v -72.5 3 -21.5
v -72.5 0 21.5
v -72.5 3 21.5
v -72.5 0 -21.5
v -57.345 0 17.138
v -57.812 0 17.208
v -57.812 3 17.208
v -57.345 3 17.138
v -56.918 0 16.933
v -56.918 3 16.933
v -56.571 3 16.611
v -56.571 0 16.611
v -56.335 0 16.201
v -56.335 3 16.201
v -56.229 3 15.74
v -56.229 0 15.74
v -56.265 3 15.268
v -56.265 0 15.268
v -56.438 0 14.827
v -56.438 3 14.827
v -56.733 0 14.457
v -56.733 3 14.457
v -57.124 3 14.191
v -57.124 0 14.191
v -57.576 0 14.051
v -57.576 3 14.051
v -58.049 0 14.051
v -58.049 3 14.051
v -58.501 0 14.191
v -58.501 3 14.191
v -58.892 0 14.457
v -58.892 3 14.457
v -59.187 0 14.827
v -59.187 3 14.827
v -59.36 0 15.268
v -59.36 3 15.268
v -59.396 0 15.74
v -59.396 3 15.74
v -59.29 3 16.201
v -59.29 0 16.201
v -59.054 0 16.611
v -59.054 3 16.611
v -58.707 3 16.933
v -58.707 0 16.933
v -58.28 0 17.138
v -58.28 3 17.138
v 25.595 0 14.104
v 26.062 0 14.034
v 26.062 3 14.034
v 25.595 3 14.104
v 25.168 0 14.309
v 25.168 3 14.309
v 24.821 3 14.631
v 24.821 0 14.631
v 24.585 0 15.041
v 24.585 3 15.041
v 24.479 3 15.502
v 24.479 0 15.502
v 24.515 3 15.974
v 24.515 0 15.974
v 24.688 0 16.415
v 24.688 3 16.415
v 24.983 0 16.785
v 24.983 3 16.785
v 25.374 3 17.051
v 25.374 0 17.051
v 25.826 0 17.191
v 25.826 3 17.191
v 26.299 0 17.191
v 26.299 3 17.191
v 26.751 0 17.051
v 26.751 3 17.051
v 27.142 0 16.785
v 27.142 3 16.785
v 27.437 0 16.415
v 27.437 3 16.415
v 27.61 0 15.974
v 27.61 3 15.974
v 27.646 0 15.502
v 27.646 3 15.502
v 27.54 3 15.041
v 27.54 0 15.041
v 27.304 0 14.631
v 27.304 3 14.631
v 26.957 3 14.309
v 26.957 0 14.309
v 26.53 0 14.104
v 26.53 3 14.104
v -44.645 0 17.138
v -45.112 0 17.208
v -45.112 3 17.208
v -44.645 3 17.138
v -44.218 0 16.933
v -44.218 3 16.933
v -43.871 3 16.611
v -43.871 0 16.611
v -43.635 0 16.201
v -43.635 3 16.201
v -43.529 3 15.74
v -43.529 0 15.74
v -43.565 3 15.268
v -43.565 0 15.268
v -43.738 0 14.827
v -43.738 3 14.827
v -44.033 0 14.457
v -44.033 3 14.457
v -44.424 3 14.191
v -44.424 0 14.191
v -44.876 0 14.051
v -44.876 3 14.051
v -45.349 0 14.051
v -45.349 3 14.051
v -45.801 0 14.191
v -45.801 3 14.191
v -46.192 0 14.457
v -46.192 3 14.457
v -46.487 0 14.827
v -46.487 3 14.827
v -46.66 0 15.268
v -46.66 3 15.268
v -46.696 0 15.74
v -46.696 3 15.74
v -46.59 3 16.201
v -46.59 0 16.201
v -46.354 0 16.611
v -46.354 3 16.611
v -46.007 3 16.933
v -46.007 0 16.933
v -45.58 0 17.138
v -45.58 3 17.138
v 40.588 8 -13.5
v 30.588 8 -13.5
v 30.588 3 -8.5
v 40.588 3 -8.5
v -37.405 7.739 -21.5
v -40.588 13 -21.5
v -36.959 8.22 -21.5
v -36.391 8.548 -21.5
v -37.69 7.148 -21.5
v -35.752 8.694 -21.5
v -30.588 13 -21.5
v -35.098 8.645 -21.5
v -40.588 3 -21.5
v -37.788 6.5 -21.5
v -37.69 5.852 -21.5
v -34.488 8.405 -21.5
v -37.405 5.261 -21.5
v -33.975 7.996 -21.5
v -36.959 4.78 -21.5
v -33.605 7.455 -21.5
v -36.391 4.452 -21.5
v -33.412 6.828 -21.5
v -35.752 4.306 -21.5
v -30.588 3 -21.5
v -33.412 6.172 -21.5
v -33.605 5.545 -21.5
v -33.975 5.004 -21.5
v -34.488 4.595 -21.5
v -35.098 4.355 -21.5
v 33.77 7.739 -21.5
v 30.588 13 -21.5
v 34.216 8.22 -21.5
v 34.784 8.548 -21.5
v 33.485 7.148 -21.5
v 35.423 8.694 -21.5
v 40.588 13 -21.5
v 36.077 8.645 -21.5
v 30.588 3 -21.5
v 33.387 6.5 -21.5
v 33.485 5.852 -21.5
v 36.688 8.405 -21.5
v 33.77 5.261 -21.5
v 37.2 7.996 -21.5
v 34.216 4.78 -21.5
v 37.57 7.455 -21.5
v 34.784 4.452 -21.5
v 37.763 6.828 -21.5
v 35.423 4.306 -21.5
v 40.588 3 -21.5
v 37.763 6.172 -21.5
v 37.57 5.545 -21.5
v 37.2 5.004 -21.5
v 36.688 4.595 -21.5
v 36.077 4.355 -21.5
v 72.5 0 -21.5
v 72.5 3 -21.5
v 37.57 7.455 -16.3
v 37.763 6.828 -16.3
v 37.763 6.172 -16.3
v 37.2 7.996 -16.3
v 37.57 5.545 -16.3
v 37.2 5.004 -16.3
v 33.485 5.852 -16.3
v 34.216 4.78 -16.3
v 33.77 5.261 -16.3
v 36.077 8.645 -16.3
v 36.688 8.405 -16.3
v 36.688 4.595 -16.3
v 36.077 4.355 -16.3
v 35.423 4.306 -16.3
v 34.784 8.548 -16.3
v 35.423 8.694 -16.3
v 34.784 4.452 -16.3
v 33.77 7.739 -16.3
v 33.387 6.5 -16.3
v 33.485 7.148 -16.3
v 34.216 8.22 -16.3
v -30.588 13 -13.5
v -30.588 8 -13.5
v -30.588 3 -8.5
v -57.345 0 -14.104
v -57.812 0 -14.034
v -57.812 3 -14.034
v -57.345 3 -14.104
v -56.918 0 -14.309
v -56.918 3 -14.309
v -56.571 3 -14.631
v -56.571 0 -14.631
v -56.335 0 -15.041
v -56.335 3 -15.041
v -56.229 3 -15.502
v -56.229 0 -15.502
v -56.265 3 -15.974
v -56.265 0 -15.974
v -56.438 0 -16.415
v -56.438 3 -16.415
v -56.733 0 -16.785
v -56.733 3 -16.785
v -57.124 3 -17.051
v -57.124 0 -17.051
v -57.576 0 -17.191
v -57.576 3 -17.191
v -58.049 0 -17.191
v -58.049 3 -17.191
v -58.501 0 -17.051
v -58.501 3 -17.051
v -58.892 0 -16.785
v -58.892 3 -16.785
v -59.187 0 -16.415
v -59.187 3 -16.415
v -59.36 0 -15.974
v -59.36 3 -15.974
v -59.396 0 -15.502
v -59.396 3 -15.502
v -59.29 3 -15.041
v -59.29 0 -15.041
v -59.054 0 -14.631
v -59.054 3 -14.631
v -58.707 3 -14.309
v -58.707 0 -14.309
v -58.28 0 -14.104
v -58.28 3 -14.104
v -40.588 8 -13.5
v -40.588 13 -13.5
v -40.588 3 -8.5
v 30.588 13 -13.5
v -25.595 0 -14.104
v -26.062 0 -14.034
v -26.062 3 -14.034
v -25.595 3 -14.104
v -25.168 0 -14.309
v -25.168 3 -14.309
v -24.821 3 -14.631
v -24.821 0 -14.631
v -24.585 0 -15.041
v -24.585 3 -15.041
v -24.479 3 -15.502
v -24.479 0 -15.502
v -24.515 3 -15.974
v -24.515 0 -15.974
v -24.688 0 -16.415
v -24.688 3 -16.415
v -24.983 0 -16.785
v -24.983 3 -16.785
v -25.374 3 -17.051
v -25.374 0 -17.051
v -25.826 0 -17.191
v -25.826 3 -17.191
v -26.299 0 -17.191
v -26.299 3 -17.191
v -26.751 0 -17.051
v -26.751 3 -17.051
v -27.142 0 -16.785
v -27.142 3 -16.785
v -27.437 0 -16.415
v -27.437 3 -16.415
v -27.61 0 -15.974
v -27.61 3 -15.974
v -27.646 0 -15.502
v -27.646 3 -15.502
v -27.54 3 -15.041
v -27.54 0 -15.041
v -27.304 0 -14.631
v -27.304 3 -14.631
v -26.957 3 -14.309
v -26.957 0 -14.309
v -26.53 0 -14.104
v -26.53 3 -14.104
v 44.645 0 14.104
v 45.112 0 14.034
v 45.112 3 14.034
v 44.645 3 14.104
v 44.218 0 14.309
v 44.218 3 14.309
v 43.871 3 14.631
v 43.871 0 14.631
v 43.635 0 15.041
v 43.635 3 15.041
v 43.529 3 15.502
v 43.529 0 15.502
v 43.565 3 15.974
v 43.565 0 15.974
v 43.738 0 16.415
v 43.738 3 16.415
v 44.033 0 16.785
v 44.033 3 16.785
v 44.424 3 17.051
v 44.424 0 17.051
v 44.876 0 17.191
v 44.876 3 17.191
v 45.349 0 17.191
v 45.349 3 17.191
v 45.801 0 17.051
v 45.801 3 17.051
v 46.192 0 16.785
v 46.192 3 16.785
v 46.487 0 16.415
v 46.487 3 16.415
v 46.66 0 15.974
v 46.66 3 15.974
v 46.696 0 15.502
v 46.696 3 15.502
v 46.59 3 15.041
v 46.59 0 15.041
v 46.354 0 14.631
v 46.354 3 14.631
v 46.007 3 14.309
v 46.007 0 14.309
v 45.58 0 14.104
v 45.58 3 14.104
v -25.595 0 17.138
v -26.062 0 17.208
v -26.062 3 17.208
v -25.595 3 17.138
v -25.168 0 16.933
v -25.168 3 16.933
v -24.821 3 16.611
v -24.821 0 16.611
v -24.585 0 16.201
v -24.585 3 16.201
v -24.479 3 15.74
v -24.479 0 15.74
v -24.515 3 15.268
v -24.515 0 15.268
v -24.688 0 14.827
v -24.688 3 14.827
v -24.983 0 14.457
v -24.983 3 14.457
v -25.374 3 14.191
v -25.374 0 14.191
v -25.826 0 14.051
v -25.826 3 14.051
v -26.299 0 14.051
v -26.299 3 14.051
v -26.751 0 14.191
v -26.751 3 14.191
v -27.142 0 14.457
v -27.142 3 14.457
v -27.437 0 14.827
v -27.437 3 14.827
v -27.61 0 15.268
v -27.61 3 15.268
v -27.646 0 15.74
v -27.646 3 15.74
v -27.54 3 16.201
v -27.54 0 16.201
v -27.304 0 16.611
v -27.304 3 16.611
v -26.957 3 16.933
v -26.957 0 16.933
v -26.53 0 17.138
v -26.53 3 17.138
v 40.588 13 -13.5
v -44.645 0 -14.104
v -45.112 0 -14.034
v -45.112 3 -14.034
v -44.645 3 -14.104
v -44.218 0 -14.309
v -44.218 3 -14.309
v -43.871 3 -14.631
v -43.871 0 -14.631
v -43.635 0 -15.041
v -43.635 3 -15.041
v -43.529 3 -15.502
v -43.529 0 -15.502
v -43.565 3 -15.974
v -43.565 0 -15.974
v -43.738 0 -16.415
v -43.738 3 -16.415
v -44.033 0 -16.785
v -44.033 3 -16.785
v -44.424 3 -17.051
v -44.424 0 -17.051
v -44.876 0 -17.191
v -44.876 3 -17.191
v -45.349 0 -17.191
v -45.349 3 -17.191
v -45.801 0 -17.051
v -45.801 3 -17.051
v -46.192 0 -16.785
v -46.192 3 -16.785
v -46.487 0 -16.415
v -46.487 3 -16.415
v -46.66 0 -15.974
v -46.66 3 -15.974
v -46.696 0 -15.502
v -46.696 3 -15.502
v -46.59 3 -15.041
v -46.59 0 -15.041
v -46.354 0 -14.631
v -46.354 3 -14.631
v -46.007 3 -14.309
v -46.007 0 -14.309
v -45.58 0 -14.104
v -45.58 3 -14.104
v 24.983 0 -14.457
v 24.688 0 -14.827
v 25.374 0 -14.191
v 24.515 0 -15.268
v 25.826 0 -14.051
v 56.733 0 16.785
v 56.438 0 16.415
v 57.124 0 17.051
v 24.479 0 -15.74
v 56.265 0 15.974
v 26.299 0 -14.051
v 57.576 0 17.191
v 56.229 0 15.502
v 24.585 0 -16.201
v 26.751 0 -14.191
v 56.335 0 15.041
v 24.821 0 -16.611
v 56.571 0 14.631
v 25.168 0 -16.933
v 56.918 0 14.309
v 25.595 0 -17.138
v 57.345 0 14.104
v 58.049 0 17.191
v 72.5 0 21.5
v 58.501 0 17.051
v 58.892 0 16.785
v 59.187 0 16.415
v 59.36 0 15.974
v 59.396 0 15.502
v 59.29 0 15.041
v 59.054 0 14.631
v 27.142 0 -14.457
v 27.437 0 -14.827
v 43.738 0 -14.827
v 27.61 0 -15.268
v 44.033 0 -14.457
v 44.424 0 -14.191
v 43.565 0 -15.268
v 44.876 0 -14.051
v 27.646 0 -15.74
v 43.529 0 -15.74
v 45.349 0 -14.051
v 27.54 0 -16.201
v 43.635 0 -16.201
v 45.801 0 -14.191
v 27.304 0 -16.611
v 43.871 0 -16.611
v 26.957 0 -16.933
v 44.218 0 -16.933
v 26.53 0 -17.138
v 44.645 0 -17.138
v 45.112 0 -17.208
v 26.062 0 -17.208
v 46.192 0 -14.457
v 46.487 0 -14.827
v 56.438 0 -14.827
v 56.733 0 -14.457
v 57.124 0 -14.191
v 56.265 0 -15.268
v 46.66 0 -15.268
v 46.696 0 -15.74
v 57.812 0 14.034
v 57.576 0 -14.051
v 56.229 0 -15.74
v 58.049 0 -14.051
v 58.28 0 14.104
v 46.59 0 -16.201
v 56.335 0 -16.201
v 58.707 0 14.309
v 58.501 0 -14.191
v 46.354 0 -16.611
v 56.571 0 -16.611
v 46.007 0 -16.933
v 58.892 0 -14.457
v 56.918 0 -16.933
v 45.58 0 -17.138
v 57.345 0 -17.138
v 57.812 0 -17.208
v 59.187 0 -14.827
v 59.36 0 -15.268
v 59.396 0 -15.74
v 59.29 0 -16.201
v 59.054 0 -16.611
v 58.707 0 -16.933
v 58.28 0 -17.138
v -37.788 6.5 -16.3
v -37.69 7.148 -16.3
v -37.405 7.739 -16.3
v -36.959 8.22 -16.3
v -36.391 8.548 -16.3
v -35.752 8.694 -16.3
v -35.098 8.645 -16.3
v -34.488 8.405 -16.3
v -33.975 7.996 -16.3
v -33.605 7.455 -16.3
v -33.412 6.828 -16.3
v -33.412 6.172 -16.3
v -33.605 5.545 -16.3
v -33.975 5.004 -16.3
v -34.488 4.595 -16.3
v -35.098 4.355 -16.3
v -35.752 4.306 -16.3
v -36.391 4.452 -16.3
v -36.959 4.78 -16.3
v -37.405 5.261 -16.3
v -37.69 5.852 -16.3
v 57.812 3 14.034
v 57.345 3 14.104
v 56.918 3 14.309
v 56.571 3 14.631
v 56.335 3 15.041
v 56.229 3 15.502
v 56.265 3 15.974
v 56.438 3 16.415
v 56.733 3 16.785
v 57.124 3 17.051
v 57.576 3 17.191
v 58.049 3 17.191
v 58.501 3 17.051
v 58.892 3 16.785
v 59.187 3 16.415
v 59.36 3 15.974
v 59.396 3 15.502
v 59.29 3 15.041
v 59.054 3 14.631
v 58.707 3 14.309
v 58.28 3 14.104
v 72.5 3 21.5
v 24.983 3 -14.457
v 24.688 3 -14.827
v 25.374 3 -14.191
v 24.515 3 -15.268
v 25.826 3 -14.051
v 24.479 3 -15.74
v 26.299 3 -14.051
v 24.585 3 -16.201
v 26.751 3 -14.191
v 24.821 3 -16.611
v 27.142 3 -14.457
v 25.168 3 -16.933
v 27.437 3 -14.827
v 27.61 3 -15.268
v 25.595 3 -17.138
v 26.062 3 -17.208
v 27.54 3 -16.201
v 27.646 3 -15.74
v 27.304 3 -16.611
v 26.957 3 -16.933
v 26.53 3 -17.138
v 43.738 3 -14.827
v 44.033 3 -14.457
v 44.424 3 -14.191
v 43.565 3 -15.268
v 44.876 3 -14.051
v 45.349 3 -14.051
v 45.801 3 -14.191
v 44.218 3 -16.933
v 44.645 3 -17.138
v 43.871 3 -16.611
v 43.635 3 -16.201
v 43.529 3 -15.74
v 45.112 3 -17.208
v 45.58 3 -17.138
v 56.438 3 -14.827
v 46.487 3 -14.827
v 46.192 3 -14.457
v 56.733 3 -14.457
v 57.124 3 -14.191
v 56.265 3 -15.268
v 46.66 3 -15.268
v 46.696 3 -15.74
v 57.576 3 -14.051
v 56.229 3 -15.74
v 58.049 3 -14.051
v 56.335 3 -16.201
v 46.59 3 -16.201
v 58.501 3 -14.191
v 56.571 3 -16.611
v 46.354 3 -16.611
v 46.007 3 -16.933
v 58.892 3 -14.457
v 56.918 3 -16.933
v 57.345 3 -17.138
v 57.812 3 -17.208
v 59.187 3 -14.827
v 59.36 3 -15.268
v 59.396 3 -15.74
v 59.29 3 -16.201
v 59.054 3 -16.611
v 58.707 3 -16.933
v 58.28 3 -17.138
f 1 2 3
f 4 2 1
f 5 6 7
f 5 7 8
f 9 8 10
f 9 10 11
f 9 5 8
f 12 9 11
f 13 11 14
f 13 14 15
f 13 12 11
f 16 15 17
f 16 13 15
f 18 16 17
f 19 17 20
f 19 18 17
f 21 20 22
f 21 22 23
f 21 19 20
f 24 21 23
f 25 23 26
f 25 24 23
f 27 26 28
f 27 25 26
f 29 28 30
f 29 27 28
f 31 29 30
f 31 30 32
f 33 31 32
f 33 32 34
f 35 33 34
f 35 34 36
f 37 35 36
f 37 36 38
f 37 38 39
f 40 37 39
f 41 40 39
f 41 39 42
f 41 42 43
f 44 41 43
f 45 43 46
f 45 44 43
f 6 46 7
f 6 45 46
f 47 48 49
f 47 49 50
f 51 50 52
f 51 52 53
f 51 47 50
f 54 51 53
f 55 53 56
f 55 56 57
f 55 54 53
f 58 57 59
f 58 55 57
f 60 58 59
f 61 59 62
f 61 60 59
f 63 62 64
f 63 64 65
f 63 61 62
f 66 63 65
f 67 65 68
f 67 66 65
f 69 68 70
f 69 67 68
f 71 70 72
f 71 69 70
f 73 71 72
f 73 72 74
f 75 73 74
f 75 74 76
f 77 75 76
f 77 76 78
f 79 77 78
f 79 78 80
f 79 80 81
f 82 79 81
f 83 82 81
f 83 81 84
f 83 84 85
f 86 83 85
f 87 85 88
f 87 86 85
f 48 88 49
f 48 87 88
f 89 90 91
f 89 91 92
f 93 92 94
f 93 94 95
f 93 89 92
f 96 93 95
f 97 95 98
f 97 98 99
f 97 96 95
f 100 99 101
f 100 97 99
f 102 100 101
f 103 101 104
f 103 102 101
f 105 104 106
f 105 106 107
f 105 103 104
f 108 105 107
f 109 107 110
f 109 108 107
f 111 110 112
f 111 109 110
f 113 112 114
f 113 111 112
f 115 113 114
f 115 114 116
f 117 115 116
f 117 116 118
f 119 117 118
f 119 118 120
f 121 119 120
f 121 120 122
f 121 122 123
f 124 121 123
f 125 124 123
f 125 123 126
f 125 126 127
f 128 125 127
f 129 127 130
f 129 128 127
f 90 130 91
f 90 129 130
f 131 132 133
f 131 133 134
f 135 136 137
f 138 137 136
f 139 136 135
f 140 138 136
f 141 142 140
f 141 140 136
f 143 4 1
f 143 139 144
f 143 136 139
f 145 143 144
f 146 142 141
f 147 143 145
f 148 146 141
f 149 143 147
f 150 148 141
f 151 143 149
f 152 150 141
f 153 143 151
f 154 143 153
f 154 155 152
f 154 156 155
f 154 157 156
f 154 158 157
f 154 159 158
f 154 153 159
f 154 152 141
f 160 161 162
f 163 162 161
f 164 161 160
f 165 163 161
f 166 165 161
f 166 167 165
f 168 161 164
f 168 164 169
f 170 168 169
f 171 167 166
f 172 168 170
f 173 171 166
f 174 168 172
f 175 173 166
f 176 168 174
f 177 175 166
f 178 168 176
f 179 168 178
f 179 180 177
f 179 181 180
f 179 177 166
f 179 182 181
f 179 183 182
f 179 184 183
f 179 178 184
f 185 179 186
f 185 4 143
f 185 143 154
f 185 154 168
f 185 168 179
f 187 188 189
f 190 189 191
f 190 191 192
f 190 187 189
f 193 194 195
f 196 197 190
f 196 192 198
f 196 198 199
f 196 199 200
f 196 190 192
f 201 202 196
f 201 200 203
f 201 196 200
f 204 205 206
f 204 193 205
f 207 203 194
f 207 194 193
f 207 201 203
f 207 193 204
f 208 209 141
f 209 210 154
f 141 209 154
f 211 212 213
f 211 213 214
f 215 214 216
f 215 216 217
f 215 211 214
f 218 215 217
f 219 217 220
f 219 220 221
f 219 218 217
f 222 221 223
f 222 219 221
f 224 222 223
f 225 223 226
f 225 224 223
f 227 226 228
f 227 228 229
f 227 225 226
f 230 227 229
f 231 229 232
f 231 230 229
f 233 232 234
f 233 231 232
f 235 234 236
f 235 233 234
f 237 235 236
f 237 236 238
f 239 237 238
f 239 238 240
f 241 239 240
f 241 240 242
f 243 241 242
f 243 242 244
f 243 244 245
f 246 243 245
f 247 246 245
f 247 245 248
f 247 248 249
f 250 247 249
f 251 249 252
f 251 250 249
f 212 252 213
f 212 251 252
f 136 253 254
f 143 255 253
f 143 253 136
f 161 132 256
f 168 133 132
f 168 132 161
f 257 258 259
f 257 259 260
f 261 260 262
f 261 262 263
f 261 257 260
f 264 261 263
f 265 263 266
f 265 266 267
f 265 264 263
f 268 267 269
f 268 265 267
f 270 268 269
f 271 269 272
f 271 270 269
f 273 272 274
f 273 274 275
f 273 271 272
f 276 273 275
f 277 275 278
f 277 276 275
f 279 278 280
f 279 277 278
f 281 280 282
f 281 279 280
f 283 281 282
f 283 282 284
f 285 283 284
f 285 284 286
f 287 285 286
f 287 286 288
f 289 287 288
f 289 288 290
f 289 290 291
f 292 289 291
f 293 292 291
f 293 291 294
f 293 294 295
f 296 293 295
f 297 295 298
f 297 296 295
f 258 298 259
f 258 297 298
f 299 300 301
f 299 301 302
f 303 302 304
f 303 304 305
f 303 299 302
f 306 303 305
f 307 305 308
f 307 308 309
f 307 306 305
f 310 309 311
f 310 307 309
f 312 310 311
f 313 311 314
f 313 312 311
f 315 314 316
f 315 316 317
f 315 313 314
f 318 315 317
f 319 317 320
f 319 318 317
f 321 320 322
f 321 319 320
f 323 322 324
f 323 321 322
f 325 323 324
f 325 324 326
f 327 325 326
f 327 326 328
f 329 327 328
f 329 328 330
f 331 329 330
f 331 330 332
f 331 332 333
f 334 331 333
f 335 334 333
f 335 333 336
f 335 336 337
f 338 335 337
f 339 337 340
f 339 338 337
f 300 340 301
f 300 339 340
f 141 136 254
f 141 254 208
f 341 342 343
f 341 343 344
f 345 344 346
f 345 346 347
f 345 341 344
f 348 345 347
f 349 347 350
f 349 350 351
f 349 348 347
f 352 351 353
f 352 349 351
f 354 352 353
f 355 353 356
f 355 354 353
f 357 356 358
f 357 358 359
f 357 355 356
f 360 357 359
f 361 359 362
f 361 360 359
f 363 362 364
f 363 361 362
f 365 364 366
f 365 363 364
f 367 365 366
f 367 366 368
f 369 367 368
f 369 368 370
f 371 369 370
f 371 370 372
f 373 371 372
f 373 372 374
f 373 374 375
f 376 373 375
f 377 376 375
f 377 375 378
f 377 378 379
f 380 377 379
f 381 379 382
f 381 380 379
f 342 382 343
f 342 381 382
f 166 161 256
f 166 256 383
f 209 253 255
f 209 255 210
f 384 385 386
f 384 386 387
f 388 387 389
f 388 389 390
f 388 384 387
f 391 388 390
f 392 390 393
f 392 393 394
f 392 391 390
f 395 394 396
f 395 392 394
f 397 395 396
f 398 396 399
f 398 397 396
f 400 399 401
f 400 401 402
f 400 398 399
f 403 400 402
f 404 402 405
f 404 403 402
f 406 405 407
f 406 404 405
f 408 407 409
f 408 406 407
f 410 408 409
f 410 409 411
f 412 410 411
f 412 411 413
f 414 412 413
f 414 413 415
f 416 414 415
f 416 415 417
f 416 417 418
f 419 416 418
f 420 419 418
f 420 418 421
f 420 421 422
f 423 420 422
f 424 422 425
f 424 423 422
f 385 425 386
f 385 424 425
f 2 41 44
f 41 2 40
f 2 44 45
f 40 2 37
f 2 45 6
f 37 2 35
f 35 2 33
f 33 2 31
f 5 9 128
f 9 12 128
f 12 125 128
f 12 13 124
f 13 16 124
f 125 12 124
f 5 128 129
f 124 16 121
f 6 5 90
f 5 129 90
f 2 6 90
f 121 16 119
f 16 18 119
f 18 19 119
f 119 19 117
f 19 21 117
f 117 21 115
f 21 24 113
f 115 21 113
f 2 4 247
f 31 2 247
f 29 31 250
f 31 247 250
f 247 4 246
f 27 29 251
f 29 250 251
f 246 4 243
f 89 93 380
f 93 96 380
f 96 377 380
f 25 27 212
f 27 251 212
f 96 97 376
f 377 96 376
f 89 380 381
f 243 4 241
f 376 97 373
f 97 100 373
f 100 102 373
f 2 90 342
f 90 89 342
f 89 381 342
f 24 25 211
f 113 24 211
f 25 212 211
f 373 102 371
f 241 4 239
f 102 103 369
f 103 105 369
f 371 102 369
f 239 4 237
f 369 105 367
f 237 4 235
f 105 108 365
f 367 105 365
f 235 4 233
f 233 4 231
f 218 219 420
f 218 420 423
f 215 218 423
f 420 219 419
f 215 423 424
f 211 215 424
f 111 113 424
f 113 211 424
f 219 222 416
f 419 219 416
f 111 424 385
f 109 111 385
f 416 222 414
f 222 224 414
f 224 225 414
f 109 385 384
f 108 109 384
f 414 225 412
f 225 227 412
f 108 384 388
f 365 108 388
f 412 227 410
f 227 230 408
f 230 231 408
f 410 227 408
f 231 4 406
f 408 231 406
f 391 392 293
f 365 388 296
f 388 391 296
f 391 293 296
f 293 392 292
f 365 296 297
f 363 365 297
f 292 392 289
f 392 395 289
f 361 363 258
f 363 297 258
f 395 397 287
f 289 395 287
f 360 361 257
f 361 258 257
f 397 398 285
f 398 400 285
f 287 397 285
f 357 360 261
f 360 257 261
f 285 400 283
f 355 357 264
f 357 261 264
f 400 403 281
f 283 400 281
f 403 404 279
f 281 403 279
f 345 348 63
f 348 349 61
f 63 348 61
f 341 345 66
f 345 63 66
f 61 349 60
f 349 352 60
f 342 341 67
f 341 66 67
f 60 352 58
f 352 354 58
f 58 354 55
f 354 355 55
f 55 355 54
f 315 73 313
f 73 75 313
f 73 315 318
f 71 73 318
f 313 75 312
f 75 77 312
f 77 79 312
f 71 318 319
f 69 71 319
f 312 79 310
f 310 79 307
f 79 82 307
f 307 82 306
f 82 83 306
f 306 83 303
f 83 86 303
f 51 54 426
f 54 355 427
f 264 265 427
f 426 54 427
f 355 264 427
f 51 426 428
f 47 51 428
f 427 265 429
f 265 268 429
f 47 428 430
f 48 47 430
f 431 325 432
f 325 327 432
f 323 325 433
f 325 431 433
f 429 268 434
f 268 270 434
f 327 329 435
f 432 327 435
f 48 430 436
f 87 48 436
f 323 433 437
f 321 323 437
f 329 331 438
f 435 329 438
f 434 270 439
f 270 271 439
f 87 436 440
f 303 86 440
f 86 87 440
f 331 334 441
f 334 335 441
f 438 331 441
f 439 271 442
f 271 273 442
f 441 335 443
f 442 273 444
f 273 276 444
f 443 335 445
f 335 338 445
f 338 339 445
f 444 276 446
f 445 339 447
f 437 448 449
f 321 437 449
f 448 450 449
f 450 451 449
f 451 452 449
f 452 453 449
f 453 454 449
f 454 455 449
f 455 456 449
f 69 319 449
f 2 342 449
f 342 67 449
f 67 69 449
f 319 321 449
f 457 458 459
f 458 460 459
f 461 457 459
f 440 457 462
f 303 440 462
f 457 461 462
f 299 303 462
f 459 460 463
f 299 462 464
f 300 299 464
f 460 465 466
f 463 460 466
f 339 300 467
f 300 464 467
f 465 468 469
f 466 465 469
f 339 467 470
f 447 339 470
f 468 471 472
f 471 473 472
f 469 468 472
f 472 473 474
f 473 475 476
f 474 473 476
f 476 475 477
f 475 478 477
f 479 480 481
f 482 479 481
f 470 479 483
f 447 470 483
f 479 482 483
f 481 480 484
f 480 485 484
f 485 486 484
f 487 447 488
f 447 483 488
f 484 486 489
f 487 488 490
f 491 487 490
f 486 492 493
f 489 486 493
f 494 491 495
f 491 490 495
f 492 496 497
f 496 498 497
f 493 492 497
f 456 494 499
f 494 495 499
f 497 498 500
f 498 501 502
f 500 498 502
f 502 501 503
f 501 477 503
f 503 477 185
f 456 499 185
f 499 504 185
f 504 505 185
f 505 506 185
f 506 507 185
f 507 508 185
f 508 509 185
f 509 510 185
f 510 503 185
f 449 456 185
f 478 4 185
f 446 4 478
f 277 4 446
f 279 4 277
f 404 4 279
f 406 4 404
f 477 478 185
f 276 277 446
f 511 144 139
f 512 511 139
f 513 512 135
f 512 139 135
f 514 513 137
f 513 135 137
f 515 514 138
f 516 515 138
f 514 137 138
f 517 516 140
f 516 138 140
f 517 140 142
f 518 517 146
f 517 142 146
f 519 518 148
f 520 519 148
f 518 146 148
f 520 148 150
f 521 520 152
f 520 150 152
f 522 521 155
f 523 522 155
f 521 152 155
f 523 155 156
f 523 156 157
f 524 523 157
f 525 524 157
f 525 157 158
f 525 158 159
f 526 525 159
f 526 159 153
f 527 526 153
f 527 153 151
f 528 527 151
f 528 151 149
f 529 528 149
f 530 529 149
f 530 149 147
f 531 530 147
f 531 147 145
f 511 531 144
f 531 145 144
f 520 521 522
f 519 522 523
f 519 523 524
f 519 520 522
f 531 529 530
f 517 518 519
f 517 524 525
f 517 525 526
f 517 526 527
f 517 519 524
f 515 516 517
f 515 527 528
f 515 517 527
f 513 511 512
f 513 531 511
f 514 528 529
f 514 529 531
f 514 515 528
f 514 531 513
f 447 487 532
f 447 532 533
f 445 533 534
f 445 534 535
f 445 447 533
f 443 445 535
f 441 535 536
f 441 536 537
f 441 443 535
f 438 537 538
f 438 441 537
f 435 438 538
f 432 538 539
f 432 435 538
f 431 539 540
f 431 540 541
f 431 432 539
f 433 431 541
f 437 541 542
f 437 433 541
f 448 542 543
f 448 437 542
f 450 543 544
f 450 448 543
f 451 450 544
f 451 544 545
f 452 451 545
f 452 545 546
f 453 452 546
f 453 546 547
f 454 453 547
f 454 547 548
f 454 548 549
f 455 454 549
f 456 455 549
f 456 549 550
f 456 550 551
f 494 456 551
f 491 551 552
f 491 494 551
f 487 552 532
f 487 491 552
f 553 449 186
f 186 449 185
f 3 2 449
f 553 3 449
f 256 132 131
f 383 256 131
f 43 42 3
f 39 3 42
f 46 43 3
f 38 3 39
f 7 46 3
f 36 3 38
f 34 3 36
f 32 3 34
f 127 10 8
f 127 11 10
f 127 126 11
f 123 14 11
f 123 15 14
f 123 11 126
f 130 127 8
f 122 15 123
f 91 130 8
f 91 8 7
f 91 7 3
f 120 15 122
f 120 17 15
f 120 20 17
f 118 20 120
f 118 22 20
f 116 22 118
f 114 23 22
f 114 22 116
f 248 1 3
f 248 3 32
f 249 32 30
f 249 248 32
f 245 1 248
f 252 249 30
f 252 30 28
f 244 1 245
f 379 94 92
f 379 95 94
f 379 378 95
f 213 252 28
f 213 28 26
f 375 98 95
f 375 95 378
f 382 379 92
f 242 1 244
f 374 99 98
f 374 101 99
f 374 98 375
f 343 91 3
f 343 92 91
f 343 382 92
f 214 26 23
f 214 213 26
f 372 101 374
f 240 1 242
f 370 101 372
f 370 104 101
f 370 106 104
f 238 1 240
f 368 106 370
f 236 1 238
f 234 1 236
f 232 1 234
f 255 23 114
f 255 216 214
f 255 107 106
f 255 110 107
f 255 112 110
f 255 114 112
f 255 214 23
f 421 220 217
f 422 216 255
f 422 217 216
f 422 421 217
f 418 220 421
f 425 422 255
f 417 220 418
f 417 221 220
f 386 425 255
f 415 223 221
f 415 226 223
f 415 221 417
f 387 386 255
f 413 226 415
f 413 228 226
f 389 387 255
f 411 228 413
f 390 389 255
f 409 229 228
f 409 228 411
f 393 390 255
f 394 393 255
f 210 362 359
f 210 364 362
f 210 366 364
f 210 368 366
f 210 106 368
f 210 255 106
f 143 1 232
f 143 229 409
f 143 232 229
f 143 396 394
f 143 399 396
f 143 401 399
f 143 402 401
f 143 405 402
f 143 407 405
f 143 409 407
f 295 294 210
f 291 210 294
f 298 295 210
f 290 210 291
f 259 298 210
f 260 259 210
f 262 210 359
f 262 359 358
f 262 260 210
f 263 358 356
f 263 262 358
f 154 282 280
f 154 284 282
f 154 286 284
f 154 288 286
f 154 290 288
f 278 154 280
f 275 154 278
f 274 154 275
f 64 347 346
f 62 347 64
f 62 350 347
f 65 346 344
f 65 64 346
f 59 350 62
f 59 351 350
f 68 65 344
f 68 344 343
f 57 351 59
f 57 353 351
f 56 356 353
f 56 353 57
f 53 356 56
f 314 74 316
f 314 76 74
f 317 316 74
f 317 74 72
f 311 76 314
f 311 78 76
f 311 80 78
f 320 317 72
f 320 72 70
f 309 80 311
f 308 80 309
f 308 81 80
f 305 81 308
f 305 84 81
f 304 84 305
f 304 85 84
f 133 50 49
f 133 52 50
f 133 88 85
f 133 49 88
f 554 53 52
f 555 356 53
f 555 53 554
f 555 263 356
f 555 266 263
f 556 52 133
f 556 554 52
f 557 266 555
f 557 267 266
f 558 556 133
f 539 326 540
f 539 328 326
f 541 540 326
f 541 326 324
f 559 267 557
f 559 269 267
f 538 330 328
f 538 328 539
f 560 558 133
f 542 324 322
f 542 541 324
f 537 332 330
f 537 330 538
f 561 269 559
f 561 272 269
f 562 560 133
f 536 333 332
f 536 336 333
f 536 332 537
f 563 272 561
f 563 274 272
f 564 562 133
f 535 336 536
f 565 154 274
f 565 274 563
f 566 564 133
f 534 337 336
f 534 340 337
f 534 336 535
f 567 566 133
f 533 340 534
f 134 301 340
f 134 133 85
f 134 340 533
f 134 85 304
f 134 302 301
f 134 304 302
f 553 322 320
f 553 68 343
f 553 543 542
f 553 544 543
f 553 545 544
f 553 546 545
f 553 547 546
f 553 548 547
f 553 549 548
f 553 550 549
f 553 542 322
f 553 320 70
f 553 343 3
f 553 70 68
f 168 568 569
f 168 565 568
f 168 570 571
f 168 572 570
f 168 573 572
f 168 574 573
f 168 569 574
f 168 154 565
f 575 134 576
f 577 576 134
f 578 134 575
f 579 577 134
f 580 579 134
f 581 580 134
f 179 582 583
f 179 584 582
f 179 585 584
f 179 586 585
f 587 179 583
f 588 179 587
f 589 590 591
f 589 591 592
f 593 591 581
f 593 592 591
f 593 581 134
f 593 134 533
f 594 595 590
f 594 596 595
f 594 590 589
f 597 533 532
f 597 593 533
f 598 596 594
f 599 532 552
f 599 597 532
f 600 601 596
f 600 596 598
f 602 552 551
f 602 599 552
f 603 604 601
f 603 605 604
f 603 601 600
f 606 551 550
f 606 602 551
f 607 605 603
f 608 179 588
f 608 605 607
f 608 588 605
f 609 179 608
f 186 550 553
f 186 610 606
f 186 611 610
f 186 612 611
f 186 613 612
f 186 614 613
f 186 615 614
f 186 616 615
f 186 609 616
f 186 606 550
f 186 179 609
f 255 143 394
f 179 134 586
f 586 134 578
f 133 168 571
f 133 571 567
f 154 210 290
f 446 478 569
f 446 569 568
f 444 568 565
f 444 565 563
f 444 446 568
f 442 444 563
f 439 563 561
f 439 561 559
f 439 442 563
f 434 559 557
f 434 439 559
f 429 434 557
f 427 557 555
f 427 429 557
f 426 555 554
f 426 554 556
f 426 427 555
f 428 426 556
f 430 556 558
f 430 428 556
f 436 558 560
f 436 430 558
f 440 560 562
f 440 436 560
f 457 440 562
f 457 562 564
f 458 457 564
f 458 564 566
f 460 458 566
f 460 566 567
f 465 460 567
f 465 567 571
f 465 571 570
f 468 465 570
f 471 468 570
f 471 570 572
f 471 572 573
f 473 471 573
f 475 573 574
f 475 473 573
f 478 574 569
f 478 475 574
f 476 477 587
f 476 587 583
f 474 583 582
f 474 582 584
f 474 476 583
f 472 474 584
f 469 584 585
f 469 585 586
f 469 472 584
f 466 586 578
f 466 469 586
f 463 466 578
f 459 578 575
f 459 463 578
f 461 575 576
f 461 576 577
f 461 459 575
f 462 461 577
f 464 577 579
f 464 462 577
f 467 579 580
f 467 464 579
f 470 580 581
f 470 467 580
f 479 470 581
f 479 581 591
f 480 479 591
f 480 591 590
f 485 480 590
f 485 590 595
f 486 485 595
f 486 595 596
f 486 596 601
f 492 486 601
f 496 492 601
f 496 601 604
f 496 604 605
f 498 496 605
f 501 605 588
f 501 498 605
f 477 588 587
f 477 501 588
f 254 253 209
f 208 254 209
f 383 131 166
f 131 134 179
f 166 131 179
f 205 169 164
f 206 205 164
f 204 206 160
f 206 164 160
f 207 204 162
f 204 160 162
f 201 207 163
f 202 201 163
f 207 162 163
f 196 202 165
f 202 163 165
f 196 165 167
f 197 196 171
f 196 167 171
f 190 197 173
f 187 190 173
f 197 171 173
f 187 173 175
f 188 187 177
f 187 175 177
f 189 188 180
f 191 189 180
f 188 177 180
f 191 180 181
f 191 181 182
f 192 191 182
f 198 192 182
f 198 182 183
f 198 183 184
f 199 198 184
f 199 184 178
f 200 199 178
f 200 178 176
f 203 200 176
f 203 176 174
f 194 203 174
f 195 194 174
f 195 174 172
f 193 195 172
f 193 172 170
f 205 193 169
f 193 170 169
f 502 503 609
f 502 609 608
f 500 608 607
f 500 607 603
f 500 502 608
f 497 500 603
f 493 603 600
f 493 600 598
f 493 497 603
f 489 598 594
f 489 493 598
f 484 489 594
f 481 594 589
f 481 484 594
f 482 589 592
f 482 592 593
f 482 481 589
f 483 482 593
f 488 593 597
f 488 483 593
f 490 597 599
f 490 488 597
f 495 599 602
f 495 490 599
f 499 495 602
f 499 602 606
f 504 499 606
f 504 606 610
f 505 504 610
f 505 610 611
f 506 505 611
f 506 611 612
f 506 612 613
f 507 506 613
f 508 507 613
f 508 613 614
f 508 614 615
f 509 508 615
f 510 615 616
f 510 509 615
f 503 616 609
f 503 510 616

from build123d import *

# Parameters (mm, degrees)
SKETCH1_W           = 145
SKETCH1_H           = 43
SKETCH1_R           = 1.5875
BOSS_EXTRUDE1_DEPTH = 3
SKETCH4_W           = 10
SKETCH4_H           = 8
BOSS_EXTRUDE3_DEPTH = 10
CHAMFER2_SIZE       = 5
SKETCH5_R           = 2.2
CUT_EXTRUDE2_DEPTH  = 5.2


with BuildPart() as part:
    # Sketch1 → Boss-Extrude1 (new body)
    with BuildSketch(Plane(origin=(0, 0, 0), x_dir=(1, 0, 0), z_dir=(0, 1, 0))):
        Rectangle(SKETCH1_W, SKETCH1_H)
        with Locations(Location((-57.8125, 15.621, 0), (0, 0, 270))):
            Circle(SKETCH1_R, mode=Mode.SUBTRACT)
        with Locations(Location((-45.1125, 15.621, 0), (0, 0, 270))):
            Circle(SKETCH1_R, mode=Mode.SUBTRACT)
        with Locations(Location((-26.0625, 15.621, 0), (0, 0, 270))):
            Circle(SKETCH1_R, mode=Mode.SUBTRACT)
        with Locations(Location((-26.0625, -15.621, 0), (0, 0, 270))):
            Circle(SKETCH1_R, mode=Mode.SUBTRACT)
        with Locations(Location((-45.1125, -15.621, 0), (0, 0, 270))):
            Circle(SKETCH1_R, mode=Mode.SUBTRACT)
        with Locations(Location((-57.8125, -15.621, 0), (0, 0, 270))):
            Circle(SKETCH1_R, mode=Mode.SUBTRACT)
        with Locations(Location((45.1125, -15.621, 0), (0, 0, 90))):
            Circle(SKETCH1_R, mode=Mode.SUBTRACT)
        with Locations(Location((26.0625, -15.621, 0), (0, 0, 90))):
            Circle(SKETCH1_R, mode=Mode.SUBTRACT)
        with Locations(Location((26.0625, 15.621, 0), (0, 0, 90))):
            Circle(SKETCH1_R, mode=Mode.SUBTRACT)
        with Locations(Location((45.1125, 15.621, 0), (0, 0, 90))):
            Circle(SKETCH1_R, mode=Mode.SUBTRACT)
        with Locations(Location((57.8125, 15.621, 0), (0, 0, 90))):
            Circle(SKETCH1_R, mode=Mode.SUBTRACT)
        with Locations(Location((57.8125, -15.621, 0), (0, 0, 90))):
            Circle(SKETCH1_R, mode=Mode.SUBTRACT)
    extrude(amount=BOSS_EXTRUDE1_DEPTH)

    # Sketch4 → Boss-Extrude3 (add)
    with BuildSketch(Plane(origin=(0, 3, 0), x_dir=(1, 0, 0), z_dir=(0, 1, 0))):
        with Locations((-35.5875, 17.5)):
            Rectangle(SKETCH4_W, SKETCH4_H)
        with Locations((35.5875, 17.5)):
            Rectangle(SKETCH4_W, SKETCH4_H)
    extrude(amount=BOSS_EXTRUDE3_DEPTH)

    # Chamfer2
    chamfer2_edges = [part.edges().sort_by_distance(p)[0] for p in [
        (-35.5875, 3, -13.5),
        (35.5875, 3, -13.5),
    ]]
    chamfer(chamfer2_edges, length=CHAMFER2_SIZE)

    # Sketch5 → Cut-Extrude2 (cut)
    with BuildSketch(Plane(origin=(0, 0, -21.5), x_dir=(-1, 0, 0), z_dir=(0, 0, -1))):
        with Locations((-35.5875, 6.5)):
            Circle(SKETCH5_R)
        with Locations((35.5875, 6.5)):
            Circle(SKETCH5_R)
    extrude(amount=-CUT_EXTRUDE2_DEPTH, mode=Mode.SUBTRACT)


solid = part.part
